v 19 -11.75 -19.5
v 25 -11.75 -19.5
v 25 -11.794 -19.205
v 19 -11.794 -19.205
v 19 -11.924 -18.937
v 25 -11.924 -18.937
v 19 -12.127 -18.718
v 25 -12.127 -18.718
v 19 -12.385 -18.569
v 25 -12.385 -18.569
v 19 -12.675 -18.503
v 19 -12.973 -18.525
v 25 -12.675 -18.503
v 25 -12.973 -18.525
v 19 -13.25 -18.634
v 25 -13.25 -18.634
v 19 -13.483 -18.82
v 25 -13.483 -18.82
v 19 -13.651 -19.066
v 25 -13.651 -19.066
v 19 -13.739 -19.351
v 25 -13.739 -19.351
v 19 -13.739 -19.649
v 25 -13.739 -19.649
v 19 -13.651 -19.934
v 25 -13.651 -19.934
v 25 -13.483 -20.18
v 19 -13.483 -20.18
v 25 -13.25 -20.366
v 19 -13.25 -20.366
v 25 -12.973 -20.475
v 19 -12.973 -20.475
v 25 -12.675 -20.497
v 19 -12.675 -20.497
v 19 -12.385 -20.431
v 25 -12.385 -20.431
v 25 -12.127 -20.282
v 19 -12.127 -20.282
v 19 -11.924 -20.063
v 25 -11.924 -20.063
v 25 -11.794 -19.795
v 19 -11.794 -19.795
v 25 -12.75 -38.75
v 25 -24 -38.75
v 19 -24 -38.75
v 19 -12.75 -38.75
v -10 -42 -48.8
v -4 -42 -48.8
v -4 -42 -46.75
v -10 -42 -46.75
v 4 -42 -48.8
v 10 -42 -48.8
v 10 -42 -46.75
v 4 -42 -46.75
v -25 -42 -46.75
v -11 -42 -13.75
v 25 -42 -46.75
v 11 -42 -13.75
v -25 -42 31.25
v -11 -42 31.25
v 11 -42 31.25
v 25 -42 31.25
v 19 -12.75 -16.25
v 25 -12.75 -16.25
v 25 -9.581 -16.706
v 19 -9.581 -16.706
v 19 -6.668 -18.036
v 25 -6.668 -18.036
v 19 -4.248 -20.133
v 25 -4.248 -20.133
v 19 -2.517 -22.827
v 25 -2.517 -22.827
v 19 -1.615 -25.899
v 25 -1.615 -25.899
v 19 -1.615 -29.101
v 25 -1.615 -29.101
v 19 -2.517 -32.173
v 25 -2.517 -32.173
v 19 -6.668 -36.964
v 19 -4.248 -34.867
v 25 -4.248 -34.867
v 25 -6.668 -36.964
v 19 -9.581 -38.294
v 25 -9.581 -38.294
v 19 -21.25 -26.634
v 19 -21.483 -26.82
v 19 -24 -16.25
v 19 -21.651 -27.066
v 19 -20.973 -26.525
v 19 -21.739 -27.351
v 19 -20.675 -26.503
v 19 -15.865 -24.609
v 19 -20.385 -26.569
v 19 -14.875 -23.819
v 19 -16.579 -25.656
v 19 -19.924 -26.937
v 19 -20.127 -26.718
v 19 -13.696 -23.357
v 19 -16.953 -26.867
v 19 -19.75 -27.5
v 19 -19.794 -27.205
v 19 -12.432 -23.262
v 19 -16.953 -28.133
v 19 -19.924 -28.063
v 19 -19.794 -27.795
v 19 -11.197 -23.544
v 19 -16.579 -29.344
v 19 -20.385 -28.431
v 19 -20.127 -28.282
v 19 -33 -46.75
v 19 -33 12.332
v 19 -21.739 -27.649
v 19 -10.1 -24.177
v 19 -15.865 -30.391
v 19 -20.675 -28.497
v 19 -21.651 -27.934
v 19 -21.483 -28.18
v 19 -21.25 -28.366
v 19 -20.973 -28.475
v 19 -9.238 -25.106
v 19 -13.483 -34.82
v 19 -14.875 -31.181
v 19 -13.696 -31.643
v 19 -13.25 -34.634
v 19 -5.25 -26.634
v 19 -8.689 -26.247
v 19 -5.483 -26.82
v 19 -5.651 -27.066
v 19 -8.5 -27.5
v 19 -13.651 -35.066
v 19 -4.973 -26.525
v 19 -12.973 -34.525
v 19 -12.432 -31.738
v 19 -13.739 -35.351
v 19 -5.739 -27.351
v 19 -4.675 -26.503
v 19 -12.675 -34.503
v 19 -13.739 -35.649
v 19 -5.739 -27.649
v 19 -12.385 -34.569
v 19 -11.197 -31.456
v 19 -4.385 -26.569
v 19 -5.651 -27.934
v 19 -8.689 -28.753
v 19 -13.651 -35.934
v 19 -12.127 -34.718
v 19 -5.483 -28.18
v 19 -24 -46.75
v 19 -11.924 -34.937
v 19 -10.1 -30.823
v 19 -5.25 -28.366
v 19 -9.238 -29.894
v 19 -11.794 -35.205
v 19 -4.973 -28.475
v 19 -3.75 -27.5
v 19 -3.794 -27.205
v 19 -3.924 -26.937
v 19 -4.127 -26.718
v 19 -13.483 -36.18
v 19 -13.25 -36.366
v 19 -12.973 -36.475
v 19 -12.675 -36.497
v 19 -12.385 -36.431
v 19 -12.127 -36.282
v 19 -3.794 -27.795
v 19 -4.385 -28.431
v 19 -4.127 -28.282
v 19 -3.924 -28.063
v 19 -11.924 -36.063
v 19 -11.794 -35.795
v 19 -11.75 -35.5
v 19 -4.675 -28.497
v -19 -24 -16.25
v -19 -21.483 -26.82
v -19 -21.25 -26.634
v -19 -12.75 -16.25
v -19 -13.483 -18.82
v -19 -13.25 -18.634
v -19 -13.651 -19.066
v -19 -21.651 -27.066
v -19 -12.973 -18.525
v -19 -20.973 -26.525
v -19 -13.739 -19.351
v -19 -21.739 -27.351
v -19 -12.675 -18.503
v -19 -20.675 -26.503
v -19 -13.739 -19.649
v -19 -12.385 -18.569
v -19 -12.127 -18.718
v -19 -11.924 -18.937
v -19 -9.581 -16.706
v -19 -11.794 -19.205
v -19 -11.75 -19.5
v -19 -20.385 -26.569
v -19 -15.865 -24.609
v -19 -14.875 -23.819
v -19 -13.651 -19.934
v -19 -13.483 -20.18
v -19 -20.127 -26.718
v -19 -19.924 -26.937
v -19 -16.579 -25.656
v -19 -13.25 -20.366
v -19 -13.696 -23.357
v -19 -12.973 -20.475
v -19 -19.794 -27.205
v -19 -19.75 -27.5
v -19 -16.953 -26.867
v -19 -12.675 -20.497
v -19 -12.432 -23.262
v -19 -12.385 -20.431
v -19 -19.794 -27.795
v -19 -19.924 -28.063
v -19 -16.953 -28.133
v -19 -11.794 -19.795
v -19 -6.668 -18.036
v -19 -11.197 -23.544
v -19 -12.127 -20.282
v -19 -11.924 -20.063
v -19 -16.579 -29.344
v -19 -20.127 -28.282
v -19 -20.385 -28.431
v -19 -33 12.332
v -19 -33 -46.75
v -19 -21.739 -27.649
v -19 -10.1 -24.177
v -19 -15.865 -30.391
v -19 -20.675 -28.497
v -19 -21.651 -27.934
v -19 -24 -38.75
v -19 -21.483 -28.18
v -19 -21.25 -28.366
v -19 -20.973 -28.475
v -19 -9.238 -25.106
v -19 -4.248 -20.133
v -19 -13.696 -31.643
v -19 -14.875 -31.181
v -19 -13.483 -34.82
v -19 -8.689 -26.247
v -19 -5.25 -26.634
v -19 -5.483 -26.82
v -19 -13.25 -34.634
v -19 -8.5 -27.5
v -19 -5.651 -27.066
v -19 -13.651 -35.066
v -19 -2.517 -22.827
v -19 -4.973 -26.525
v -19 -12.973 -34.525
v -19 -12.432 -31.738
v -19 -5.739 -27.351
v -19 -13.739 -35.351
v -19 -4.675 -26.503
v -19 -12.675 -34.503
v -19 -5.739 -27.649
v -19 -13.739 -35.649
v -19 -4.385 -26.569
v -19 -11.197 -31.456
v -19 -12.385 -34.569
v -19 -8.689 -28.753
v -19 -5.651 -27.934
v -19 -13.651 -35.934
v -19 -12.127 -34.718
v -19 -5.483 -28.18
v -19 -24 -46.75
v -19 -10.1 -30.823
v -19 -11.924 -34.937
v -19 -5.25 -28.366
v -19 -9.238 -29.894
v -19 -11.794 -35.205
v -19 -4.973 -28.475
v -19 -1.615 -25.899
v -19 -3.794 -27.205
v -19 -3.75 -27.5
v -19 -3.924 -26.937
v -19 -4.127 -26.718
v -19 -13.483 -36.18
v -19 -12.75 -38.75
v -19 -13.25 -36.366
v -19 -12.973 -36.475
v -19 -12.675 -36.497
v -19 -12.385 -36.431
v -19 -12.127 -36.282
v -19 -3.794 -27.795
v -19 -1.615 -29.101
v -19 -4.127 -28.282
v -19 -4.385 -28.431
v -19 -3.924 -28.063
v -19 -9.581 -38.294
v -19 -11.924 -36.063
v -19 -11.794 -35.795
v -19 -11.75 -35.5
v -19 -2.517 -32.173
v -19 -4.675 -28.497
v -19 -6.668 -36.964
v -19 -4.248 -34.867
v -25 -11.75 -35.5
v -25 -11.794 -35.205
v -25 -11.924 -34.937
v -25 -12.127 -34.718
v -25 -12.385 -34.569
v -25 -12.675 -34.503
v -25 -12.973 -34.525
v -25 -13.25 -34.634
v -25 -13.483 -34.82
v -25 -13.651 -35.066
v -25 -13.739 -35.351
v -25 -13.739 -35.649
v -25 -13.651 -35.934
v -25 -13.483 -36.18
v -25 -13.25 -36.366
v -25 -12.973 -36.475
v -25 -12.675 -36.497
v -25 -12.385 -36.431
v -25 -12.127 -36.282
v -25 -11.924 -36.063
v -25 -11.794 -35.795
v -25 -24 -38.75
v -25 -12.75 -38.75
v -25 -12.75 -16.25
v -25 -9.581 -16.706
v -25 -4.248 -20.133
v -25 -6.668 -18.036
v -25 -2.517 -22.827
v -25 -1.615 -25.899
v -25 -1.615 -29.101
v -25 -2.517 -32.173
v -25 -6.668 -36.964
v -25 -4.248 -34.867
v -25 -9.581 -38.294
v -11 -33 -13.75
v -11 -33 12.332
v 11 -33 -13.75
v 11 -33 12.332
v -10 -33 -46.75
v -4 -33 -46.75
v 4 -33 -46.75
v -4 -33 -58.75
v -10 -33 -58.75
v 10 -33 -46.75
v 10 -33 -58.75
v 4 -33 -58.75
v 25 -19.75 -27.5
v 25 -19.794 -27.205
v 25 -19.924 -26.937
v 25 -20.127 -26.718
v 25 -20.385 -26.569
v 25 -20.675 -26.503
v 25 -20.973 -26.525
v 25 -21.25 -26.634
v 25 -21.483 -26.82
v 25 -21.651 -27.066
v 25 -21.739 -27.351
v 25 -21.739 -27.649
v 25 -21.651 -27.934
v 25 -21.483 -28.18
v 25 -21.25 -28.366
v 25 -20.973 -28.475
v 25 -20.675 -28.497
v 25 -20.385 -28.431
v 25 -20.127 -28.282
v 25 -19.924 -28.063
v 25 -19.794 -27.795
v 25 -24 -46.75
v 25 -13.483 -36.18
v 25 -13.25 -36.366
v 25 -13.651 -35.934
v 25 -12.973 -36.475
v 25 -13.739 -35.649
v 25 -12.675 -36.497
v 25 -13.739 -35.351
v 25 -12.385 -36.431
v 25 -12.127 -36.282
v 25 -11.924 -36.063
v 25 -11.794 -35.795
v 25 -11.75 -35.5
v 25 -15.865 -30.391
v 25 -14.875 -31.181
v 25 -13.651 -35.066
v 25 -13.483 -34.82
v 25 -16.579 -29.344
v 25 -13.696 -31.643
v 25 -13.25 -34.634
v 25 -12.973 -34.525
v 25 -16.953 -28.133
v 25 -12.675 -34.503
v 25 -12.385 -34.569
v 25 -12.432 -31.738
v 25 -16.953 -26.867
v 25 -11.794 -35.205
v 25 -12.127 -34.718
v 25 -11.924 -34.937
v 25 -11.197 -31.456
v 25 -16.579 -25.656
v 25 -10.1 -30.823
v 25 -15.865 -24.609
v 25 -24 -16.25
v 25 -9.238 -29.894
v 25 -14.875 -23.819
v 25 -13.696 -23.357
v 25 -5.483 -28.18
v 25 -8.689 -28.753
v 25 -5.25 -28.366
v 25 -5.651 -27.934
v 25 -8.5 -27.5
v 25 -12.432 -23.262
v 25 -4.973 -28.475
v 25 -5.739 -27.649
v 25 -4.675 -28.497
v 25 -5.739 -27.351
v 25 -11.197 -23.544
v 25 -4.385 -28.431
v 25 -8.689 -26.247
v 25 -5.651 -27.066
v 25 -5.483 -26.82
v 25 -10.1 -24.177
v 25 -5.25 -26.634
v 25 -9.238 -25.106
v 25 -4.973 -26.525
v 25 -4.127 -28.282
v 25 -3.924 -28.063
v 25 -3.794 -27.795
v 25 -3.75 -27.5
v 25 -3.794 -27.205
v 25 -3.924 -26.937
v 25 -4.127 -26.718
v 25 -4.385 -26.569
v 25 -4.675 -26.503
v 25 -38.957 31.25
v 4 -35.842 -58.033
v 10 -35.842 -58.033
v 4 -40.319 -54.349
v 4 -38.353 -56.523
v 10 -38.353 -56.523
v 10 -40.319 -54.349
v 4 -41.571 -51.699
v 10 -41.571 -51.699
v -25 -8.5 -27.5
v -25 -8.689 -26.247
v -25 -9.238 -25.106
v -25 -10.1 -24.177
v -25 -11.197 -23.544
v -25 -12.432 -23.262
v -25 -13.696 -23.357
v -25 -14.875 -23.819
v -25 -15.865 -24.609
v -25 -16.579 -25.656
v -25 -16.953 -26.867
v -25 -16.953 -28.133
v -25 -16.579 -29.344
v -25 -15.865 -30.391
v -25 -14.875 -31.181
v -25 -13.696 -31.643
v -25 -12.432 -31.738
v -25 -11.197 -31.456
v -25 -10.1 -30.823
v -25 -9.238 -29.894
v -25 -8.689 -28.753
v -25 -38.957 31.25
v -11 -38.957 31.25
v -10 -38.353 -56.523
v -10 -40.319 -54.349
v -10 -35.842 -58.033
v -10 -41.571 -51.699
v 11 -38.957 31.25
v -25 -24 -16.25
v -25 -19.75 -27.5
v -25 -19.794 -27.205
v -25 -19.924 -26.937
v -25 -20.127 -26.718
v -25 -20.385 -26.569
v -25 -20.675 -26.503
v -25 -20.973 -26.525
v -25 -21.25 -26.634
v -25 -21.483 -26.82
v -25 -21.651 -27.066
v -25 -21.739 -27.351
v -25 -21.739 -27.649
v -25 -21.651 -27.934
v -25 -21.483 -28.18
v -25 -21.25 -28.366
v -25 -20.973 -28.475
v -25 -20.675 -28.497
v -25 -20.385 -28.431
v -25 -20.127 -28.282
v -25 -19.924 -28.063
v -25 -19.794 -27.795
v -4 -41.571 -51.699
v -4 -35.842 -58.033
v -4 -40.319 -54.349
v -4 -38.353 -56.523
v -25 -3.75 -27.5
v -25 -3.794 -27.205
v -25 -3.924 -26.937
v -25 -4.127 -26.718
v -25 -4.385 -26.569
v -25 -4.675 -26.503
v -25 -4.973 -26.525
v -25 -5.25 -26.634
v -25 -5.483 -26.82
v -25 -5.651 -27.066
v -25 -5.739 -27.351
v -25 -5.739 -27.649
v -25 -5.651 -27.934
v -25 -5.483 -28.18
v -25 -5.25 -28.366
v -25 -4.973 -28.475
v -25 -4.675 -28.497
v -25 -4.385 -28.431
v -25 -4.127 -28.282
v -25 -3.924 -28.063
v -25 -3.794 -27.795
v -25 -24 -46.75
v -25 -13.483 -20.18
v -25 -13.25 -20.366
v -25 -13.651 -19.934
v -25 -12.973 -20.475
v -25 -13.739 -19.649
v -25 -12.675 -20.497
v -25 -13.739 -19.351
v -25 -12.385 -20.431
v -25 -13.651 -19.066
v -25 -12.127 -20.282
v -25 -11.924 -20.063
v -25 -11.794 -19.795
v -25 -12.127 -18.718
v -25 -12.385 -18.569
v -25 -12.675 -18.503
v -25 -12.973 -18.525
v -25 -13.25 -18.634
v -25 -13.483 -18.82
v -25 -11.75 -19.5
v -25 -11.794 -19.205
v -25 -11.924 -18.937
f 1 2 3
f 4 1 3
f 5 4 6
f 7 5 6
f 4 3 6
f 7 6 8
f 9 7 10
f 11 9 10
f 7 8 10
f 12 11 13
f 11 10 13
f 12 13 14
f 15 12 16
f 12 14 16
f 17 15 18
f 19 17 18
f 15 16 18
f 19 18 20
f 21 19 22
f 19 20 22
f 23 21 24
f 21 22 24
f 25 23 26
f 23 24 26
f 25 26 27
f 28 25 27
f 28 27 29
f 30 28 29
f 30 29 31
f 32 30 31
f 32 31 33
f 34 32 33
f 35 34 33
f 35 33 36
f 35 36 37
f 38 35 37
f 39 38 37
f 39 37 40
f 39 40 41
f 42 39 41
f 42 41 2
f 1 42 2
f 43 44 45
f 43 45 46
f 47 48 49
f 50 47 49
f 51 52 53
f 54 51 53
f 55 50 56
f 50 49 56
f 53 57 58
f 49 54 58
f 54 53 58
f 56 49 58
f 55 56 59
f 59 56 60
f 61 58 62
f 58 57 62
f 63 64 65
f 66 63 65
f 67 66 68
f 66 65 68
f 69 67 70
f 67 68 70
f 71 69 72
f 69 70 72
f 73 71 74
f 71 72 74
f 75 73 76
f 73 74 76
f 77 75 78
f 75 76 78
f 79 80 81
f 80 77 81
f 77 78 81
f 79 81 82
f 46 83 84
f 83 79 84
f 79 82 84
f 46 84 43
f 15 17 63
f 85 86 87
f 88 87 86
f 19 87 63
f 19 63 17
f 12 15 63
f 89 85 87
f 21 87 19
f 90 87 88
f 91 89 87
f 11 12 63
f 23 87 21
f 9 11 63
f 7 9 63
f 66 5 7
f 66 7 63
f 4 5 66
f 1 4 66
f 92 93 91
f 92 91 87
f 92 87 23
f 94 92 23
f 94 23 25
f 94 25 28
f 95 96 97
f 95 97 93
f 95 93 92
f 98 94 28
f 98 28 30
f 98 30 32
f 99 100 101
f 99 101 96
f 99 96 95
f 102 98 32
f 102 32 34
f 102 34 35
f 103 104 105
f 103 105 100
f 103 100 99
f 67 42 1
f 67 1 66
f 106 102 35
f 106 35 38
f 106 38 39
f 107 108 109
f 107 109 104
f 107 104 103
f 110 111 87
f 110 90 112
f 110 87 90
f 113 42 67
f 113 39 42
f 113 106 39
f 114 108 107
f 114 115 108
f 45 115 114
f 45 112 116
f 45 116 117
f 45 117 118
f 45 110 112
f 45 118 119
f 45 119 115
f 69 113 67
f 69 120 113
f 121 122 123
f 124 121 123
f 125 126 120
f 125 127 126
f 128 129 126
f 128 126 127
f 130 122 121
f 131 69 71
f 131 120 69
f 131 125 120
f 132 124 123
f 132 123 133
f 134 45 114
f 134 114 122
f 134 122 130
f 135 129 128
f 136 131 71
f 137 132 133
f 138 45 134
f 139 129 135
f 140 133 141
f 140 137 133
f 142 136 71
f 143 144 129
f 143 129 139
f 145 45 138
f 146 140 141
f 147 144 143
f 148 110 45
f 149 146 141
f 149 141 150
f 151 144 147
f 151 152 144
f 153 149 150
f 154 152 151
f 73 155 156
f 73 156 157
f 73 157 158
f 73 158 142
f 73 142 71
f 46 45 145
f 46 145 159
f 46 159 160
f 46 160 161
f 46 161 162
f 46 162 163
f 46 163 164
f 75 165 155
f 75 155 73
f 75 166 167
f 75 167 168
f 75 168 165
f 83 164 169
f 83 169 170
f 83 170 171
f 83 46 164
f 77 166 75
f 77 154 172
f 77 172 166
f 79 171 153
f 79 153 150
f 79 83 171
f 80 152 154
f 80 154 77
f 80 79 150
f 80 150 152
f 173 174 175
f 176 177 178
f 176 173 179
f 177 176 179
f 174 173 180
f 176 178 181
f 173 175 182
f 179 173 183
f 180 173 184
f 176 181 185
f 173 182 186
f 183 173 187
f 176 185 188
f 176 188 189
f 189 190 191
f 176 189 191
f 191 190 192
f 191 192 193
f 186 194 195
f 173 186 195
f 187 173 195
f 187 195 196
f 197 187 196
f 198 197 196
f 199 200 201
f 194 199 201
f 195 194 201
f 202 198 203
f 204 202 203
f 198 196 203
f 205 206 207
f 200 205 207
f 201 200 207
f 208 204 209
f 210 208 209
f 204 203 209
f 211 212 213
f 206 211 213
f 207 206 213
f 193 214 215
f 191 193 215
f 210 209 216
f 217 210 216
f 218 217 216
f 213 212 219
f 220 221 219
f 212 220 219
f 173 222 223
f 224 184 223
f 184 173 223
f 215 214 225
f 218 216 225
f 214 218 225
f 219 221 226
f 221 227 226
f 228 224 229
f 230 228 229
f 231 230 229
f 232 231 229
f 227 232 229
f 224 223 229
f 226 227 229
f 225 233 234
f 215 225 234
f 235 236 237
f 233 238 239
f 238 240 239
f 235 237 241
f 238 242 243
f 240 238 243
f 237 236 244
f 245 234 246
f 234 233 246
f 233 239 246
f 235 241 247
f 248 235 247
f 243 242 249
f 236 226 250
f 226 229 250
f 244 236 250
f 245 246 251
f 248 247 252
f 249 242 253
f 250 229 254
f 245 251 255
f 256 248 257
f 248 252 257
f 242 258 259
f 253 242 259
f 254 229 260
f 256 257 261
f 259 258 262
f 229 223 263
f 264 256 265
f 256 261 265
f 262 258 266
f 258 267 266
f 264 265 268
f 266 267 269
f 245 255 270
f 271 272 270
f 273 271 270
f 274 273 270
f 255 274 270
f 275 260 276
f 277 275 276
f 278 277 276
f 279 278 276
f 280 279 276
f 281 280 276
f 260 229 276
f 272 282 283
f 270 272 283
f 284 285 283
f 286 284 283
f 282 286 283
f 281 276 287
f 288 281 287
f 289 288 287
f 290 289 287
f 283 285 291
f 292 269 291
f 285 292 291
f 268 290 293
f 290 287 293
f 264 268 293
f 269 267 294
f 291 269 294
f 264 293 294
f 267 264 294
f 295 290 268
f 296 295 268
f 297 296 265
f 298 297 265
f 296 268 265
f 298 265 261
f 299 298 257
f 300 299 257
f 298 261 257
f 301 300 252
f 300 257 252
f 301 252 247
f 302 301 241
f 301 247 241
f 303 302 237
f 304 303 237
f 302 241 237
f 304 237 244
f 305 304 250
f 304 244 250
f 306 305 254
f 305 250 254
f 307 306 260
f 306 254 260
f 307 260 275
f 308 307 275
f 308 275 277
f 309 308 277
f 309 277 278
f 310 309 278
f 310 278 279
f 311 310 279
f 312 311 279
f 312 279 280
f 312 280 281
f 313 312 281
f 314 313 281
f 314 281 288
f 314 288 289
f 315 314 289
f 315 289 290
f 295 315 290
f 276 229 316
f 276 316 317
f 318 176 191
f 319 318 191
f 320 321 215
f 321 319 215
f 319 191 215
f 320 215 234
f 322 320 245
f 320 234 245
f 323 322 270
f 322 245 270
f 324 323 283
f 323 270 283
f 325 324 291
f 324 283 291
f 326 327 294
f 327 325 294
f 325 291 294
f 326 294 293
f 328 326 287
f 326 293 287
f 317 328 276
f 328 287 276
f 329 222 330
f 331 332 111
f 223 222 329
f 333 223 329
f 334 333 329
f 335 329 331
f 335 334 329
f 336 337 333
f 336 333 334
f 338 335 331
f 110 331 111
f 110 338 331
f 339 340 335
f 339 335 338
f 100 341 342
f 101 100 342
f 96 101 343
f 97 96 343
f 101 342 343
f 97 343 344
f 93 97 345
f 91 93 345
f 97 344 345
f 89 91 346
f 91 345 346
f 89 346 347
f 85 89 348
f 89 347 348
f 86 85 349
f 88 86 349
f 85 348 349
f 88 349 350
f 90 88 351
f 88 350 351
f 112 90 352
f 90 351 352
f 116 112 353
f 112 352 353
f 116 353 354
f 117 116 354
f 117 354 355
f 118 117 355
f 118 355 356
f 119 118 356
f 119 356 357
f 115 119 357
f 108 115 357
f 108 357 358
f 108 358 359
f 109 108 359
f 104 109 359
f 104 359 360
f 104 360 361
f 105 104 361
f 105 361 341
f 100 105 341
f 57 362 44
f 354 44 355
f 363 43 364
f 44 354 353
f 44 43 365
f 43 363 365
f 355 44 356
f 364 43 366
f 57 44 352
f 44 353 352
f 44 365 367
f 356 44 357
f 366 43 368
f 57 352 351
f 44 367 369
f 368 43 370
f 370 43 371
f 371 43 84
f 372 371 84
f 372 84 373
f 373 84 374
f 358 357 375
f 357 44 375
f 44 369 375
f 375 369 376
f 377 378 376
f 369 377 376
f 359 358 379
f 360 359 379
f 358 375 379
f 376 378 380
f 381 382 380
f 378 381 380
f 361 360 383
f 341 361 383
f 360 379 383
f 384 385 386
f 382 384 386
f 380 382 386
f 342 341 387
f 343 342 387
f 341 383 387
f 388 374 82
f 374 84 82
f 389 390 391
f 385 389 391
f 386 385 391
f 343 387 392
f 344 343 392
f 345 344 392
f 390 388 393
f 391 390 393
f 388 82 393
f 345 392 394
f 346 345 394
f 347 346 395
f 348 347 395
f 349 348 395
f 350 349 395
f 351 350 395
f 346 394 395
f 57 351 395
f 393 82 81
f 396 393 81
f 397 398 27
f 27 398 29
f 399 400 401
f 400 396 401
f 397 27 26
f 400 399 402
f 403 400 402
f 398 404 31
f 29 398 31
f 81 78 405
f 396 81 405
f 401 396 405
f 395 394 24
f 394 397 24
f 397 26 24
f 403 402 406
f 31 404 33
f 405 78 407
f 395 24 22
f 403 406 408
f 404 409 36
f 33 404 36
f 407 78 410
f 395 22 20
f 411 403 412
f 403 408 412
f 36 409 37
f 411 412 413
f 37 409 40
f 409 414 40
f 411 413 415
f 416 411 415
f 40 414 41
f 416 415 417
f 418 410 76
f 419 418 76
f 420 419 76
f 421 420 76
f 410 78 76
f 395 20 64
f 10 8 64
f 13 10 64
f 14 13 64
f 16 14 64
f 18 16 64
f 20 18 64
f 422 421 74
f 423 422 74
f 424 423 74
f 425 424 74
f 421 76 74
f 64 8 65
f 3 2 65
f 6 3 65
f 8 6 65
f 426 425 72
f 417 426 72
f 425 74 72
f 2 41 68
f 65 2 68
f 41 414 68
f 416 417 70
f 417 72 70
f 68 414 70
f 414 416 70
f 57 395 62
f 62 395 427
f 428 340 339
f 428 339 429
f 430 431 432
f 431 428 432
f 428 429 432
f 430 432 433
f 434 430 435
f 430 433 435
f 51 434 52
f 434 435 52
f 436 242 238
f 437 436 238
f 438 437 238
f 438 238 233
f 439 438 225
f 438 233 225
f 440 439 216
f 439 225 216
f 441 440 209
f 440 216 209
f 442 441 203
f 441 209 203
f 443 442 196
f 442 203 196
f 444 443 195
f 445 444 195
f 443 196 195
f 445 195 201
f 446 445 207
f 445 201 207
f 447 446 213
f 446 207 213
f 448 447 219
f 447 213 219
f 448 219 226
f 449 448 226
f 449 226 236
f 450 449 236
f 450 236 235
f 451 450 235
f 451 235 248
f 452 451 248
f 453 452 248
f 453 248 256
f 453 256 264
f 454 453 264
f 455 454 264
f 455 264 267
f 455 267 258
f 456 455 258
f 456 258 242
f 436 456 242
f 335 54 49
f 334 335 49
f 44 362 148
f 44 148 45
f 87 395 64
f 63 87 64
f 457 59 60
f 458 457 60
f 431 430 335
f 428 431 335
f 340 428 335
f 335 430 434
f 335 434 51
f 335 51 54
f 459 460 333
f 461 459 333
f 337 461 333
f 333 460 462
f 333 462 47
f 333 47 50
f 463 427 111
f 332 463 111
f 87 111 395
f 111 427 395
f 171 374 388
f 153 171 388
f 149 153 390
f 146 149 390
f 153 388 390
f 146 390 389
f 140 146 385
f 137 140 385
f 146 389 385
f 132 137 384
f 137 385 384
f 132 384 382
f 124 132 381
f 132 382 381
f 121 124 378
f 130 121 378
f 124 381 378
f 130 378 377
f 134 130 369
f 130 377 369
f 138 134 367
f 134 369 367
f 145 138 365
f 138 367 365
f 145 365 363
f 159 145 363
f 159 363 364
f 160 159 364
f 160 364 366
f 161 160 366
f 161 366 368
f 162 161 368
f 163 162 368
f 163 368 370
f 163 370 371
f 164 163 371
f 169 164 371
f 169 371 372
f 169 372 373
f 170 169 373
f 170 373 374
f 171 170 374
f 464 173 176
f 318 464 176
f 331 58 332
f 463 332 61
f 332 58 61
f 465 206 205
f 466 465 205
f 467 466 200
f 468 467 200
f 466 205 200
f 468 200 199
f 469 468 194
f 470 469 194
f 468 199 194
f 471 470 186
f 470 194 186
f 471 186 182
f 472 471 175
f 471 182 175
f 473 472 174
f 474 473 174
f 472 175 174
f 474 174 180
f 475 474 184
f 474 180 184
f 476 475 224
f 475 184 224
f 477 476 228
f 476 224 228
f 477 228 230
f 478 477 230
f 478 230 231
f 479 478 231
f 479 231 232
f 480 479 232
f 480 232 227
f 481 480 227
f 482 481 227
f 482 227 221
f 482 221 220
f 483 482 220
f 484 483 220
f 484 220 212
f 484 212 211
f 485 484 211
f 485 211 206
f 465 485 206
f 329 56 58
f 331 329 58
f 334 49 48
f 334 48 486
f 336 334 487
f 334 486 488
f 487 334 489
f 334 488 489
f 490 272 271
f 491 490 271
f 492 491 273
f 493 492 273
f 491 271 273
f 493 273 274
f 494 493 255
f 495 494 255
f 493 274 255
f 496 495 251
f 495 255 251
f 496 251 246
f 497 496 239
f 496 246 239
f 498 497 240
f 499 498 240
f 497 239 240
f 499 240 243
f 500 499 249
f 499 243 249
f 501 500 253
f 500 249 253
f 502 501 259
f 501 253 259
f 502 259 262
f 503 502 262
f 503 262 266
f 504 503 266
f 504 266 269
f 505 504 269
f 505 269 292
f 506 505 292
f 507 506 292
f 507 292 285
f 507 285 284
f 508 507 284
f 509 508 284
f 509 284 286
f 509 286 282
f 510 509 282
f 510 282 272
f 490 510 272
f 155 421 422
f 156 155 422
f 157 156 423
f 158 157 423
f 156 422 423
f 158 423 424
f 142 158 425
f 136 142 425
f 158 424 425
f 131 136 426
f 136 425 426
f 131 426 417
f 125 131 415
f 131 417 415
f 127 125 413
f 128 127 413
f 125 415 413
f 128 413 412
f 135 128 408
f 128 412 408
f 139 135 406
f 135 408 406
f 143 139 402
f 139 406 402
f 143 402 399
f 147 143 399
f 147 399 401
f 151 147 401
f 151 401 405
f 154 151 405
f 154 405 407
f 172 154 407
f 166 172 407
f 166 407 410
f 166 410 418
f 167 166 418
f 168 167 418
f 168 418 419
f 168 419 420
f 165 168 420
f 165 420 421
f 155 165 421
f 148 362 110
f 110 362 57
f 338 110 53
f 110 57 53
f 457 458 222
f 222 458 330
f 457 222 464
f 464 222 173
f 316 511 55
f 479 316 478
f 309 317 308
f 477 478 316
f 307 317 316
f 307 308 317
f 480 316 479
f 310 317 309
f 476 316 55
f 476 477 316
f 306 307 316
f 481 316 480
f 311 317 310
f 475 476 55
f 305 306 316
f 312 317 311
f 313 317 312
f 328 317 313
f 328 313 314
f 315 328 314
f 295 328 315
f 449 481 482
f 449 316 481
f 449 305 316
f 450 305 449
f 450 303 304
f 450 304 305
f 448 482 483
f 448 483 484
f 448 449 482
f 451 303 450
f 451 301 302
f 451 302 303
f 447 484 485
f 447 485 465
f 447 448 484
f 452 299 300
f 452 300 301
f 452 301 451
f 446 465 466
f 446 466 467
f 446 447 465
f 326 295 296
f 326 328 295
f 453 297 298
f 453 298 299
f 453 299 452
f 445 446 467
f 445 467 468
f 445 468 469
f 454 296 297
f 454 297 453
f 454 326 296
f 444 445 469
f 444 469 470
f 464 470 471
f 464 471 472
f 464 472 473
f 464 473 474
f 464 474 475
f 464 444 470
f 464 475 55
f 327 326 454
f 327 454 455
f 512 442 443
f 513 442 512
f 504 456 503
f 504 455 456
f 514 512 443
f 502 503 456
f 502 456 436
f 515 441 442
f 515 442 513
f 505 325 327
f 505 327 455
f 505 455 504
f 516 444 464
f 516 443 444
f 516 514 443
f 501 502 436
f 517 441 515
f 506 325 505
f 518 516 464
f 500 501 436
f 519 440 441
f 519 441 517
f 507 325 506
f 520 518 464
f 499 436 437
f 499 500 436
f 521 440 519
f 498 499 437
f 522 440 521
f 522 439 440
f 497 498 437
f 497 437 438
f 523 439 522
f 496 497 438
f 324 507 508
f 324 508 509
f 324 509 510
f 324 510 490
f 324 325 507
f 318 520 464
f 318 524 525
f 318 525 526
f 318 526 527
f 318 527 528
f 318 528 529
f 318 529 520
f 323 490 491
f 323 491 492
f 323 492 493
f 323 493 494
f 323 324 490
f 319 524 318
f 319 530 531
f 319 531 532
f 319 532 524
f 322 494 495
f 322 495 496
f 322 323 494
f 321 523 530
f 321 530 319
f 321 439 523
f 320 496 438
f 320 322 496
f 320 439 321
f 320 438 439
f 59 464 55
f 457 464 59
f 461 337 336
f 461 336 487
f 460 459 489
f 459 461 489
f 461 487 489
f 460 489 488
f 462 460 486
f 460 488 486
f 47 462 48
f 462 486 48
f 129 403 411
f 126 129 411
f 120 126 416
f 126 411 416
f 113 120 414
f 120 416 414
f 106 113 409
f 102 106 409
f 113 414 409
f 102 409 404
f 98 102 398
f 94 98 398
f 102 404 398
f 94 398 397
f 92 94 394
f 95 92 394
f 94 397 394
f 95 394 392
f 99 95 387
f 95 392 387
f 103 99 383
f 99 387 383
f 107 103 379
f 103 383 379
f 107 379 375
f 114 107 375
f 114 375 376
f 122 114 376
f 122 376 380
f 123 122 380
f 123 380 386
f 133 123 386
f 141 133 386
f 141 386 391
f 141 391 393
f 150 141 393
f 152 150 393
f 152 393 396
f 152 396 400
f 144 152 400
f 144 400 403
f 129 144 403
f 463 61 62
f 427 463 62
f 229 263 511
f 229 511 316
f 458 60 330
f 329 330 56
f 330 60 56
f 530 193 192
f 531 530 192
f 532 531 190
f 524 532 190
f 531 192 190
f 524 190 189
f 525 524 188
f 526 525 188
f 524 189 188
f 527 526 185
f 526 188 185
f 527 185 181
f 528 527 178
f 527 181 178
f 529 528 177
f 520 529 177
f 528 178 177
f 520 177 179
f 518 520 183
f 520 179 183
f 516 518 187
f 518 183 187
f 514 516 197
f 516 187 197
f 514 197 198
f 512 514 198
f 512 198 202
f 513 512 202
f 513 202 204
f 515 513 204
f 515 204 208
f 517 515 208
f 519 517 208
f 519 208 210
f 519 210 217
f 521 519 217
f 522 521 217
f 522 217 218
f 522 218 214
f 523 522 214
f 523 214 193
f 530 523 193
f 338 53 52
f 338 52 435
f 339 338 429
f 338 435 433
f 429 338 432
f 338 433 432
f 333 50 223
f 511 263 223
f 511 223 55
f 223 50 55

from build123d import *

# Parameters (mm, degrees)
SKETCH1_W           = 50
SKETCH1_H           = 170
BOSS_EXTRUDE1_DEPTH = 55
SKETCH2_W           = 34
SKETCH2_H           = 27
CUT_EXTRUDE1_DEPTH  = 181.416185527
SKETCH3_W           = 10
SKETCH3_H           = 24
SKETCH3_R           = 4.25
SKETCH3_R_2         = 1
CUT_EXTRUDE2_DEPTH  = 186.539753153
SKETCH4_W           = 2
SKETCH4_H           = 24
CUT_EXTRUDE3_DEPTH  = 178.623196683
SKETCH5_W           = 6.25
SKETCH5_H           = 11.25
CUT_EXTRUDE4_DEPTH  = 186.539753153
SKETCH6_W           = 38
SKETCH6_H           = 10
CUT_EXTRUDE5_DEPTH  = 181.416185527
SKETCH8_W           = 13.25
SKETCH8_H           = 2.25
CUT_EXTRUDE7_DEPTH  = 186.539753153
SKETCH9_W           = 34
SKETCH9_H           = 35.25
CUT_EXTRUDE8_DEPTH  = 179.297679458
SKETCH11_W          = 13.25
SKETCH11_H          = 20.25
CUT_EXTRUDE9_DEPTH  = 184.480414486
SKETCH12_W          = 28.5
SKETCH12_H          = 15
BOSS_EXTRUDE2_DEPTH = 8
SKETCH14_W          = 34
SKETCH14_H          = 15
SKETCH14_H_2        = 10.25
BOSS_EXTRUDE3_DEPTH = 13.25
SKETCH16_R          = 4.5
SKETCH16_R_2        = 2.5
CUT_EXTRUDE13_DEPTH = 8
SKETCH17_R          = 4.5
SKETCH17_W          = 55
SKETCH17_H          = 10.25
CUT_EXTRUDE15_DEPTH = 175.384811552
SKETCH18_W          = 71.25
SKETCH18_H          = 27.5
SKETCH18_W_2        = 13.75
SKETCH18_W_3        = 16.25
BOSS_EXTRUDE4_DEPTH = 50
SKETCH19_W          = 38
SKETCH19_H          = 7
CUT_EXTRUDE16_DEPTH = 152.25227271
SKETCH20_W          = 57.5
SKETCH20_H          = 27.5
CUT_EXTRUDE17_DEPTH = 102.137591923
CUT_EXTRUDE18_DEPTH = 100.39221549
SKETCH22_W          = 82.5
SKETCH22_H          = 2.5
BOSS_EXTRUDE5_DEPTH = 50
SKETCH24_W          = 22
SKETCH24_H          = 17
CUT_EXTRUDE19_DEPTH = 101.710289941
SKETCH25_W          = 38
SKETCH25_H          = 38.136363636
CUT_EXTRUDE20_DEPTH = 10
SKETCH27_W          = 38
SKETCH27_H          = 60.136363636
BOSS_EXTRUDE6_DEPTH = 8.6
SKETCH29_W          = 38
SKETCH29_H          = 1.4
CUT_EXTRUDE21_DEPTH = 85.601313414
BOSS_EXTRUDE7_DEPTH = 50
SKETCH31_W          = 38
SKETCH31_H          = 17
CUT_EXTRUDE22_DEPTH = 117.365802537
SKETCH32_W          = 100
SKETCH32_H          = 3
CUT_EXTRUDE23_DEPTH = 101.710289941
SKETCH33_W          = 20
SKETCH33_H          = 10
SKETCH33_W_2        = 22
SKETCH33_H_2        = 45
CUT_EXTRUDE24_DEPTH = 84.137311118
SKETCH34_W          = 8
SKETCH34_H          = 12
CUT_EXTRUDE25_DEPTH = 76.0787087
BOSS_EXTRUDE8_DEPTH = 8
SKETCH37_W          = 78
SKETCH37_H          = 9
SKETCH37_W_2        = 12
CUT_EXTRUDE27_DEPTH = 93.48006542
FILLET1_R           = 10


with BuildPart() as part:
    # Sketch1 → Boss-Extrude1 (new body)
    with BuildSketch(Plane.XY):
        with Locations((0, -85)):
            Rectangle(SKETCH1_W, SKETCH1_H)
    extrude(amount=-BOSS_EXTRUDE1_DEPTH)

    # Sketch2 → Cut-Extrude1 (cut, through all)
    with BuildSketch(Plane.XY):
        with Locations((0, -13.5)):
            Rectangle(SKETCH2_W, SKETCH2_H)
    extrude(amount=-CUT_EXTRUDE1_DEPTH, mode=Mode.SUBTRACT)

    # Sketch3 → Cut-Extrude2 (cut, through all)
    with BuildSketch(Plane(origin=(25, 0, 0), x_dir=(0, 0, -1), z_dir=(1, 0, 0))):
        with Locations((50, -12)):
            Rectangle(SKETCH3_W, SKETCH3_H)
        with Locations((5, -12)):
            Rectangle(SKETCH3_W, SKETCH3_H)
        with Locations(Location((27.5, -12.75, 0), (0, 0, 90))):
            Circle(SKETCH3_R)
        with Locations(Location((35.5, -12.75, 0), (0, 0, 90))):
            Circle(SKETCH3_R_2)
        with Locations(Location((27.5, -4.75, 0), (0, 0, 90))):
            Circle(SKETCH3_R_2)
        with Locations(Location((27.5, -20.75, 0), (0, 0, 90))):
            Circle(SKETCH3_R_2)
        with Locations(Location((19.5, -12.75, 0), (0, 0, 90))):
            Circle(SKETCH3_R_2)
    extrude(amount=-CUT_EXTRUDE2_DEPTH, mode=Mode.SUBTRACT)

    # Sketch4 → Cut-Extrude3 (cut, through all)
    with BuildSketch(Plane.XY.offset(-10)):
        with Locations((-18, -12)):
            Rectangle(SKETCH4_W, SKETCH4_H)
        with Locations((18, -12)):
            Rectangle(SKETCH4_W, SKETCH4_H)
    extrude(amount=-CUT_EXTRUDE3_DEPTH, mode=Mode.SUBTRACT)

    # Sketch5 → Cut-Extrude4 (cut, through all)
    with BuildSketch(Plane(origin=(25, 0, 0), x_dir=(0, 0, -1), z_dir=(1, 0, 0))):
        with BuildLine():
            Line((45, 0), (10, 0))
            Line((10, 0), (10, -12.75))
            Line((10, -12.75), (16.25, -12.75))
            ThreePointArc((16.25, -12.75), (27.5, -1.5), (38.75, -12.75))
            Line((38.75, -12.75), (45, -12.75))
            Line((45, -12.75), (45, 0))
        make_face()
        with Locations((13.125, -18.375)):
            Rectangle(SKETCH5_W, SKETCH5_H)
        with Locations((41.875, -18.375)):
            Rectangle(SKETCH5_W, SKETCH5_H)
    extrude(amount=-CUT_EXTRUDE4_DEPTH, mode=Mode.SUBTRACT)

    # Sketch6 → Cut-Extrude5 (cut, through all)
    with BuildSketch(Plane.XY):
        with Locations((0, -29)):
            Rectangle(SKETCH6_W, SKETCH6_H)
    extrude(amount=-CUT_EXTRUDE5_DEPTH, mode=Mode.SUBTRACT)

    # Sketch8 → Cut-Extrude7 (cut, through all)
    with BuildSketch(Plane(origin=(25, 0, 0), x_dir=(0, 0, -1), z_dir=(1, 0, 0))):
        with BuildLine():
            Line((27.5, -157.5), (27.5, -132.5))
            Line((27.5, -132.5), (13.25, -132.5))
            Line((13.25, -132.5), (13.25, -167.75))
            Line((13.25, -167.75), (17.25, -167.75))
            ThreePointArc((17.25, -167.75), (20.252155493, -160.502155493), (27.5, -157.5))
        make_face()
        with BuildLine():
            Line((41.75, -167.75), (41.75, -132.5))
            Line((41.75, -132.5), (27.5, -132.5))
            Line((27.5, -132.5), (27.5, -157.5))
            ThreePointArc((27.5, -157.5), (34.747844507, -160.502155493), (37.75, -167.75))
            Line((37.75, -167.75), (41.75, -167.75))
        make_face()
        with Locations((48.375, -168.875)):
            Rectangle(SKETCH8_W, SKETCH8_H)
        with Locations((6.625, -168.875)):
            Rectangle(SKETCH8_W, SKETCH8_H)
        with BuildLine():
            Line((17.25, -167.75), (13.25, -167.75))
            Line((13.25, -167.75), (13.25, -170))
            Line((13.25, -170), (17.5, -170))
            ThreePointArc((17.5, -170), (17.31269172, -168.881923142), (17.25, -167.75))
        make_face()
        with BuildLine():
            Line((41.75, -170), (41.75, -167.75))
            Line((41.75, -167.75), (37.75, -167.75))
            ThreePointArc((37.75, -167.75), (37.68730828, -168.881923142), (37.5, -170))
            Line((37.5, -170), (41.75, -170))
        make_face()
        with BuildLine():
            Line((27.5, -167.75), (27.5, -157.5))
            ThreePointArc((27.5, -157.5), (20.252155493, -160.502155493), (17.25, -167.75))
            Line((17.25, -167.75), (27.5, -167.75))
        make_face()
        with BuildLine():
            ThreePointArc((37.75, -167.75), (34.747844507, -160.502155493), (27.5, -157.5))
            Line((27.5, -157.5), (27.5, -167.75))
            Line((27.5, -167.75), (37.75, -167.75))
        make_face()
        with BuildLine():
            Line((27.5, -170), (27.5, -167.75))
            Line((27.5, -167.75), (17.25, -167.75))
            ThreePointArc((17.25, -167.75), (17.31269172, -168.881923142), (17.5, -170))
            Line((17.5, -170), (27.5, -170))
        make_face()
        with BuildLine():
            ThreePointArc((37.5, -170), (37.68730828, -168.881923142), (37.75, -167.75))
            Line((37.75, -167.75), (27.5, -167.75))
            Line((27.5, -167.75), (27.5, -170))
            Line((27.5, -170), (37.5, -170))
        make_face()
    extrude(amount=-CUT_EXTRUDE7_DEPTH, mode=Mode.SUBTRACT)

    # Sketch9 → Cut-Extrude8 (cut, through all)
    with BuildSketch(Plane.XY):
        with Locations((0, -150.125)):
            Rectangle(SKETCH9_W, SKETCH9_H)
    extrude(amount=-CUT_EXTRUDE8_DEPTH, mode=Mode.SUBTRACT)

    # Sketch11 → Cut-Extrude9 (cut, through all)
    with BuildSketch(Plane(origin=(25, 0, 0), x_dir=(0, 0, -1), z_dir=(1, 0, 0))):
        with BuildLine():
            ThreePointArc((17.25, -167.75), (20.252155493, -160.502155493), (27.5, -157.5))
            Line((27.5, -157.5), (27.5, -147.5))
            Line((27.5, -147.5), (13.25, -147.5))
            Line((13.25, -147.5), (13.25, -167.75))
            Line((13.25, -167.75), (17.25, -167.75))
        make_face()
        with BuildLine():
            Line((27.5, -147.5), (27.5, -157.5))
            ThreePointArc((27.5, -157.5), (34.747844507, -160.502155493), (37.75, -167.75))
            Line((37.75, -167.75), (41.75, -167.75))
            Line((41.75, -167.75), (41.75, -147.5))
            Line((41.75, -147.5), (27.5, -147.5))
        make_face()
        with Locations((48.375, -157.625)):
            Rectangle(SKETCH11_W, SKETCH11_H)
        with Locations((6.625, -157.625)):
            Rectangle(SKETCH11_W, SKETCH11_H)
    extrude(amount=-CUT_EXTRUDE9_DEPTH, mode=Mode.SUBTRACT)

    # Sketch12 → Boss-Extrude2 (add)
    with BuildSketch(Plane(origin=(25, 0, 0), x_dir=(0, 0, -1), z_dir=(1, 0, 0))):
        with Locations((27.5, -140)):
            Rectangle(SKETCH12_W, SKETCH12_H)
    boss_extrude2 = extrude(amount=-BOSS_EXTRUDE2_DEPTH)

    # Mirror1: Boss-Extrude2 across plane
    add(boss_extrude2.mirror(Plane(origin=(0, 0, 0), x_dir=(0, 0, 1), z_dir=(1, 0, 0))))

    # Sketch14 → Boss-Extrude3 (add)
    with BuildSketch(Plane.XY):
        with Locations((0, -140)):
            Rectangle(SKETCH14_W, SKETCH14_H)
        with Locations((0, -152.625)):
            Rectangle(SKETCH14_W, SKETCH14_H_2)
    boss_extrude3 = extrude(amount=-BOSS_EXTRUDE3_DEPTH)

    # Mirror2: Boss-Extrude3 across plane
    add(boss_extrude3.mirror(Plane.XY.offset(-27.5)))

    # Sketch16 → Cut-Extrude13 (cut)
    # profile 1 of 3: a face of its own
    with BuildSketch(Plane(origin=(25, 0, 0), x_dir=(0, 0, -1), z_dir=(1, 0, 0))):
        with Locations(Location((16.5, -135.75, 0), (0, 0, 90))):
            Circle(SKETCH16_R)
        with Locations((16.5, -135.75)):
            Circle(SKETCH16_R_2, mode=Mode.SUBTRACT)
    # profile 2 of 3: a face of its own
    with BuildSketch(Plane(origin=(25, 0, 0), x_dir=(0, 0, -1), z_dir=(1, 0, 0))):
        with Locations((16.5, -135.75)):
            Circle(SKETCH16_R_2)
    # profile 3 of 3: a face of its own
    with BuildSketch(Plane(origin=(25, 0, 0), x_dir=(0, 0, -1), z_dir=(1, 0, 0))):
        with Locations(Location((38.5, -135.75, 0), (0, 0, 90))):
            Circle(SKETCH16_R)
    cut_extrude13 = extrude(amount=-CUT_EXTRUDE13_DEPTH, mode=Mode.SUBTRACT)

    # Mirror3: Cut-Extrude13 across plane
    add(cut_extrude13.mirror(Plane(origin=(0, 0, 0), x_dir=(0, 0, 1), z_dir=(1, 0, 0))), mode=Mode.SUBTRACT)

    # Sketch17 → Cut-Extrude15 (cut, through all)
    # profile 1 of 4: a face of its own
    with BuildSketch(Plane(origin=(25, 0, 0), x_dir=(0, 0, -1), z_dir=(1, 0, 0))):
        Polygon((55, -51.5), (27.5, -51.5), (0, -51.5), (0, -147.5), (55, -147.5), align=None)
        with Locations((16.5, -135.75)):
            Circle(SKETCH17_R, mode=Mode.SUBTRACT)
        with Locations((38.5, -135.75)):
            Circle(SKETCH17_R, mode=Mode.SUBTRACT)
    # profile 2 of 4: a face of its own
    with BuildSketch(Plane(origin=(25, 0, 0), x_dir=(0, 0, -1), z_dir=(1, 0, 0))):
        with Locations((27.5, -152.625)):
            Rectangle(SKETCH17_W, SKETCH17_H)
    # profile 3 of 4: a face of its own
    with BuildSketch(Plane(origin=(25, 0, 0), x_dir=(0, 0, -1), z_dir=(1, 0, 0))):
        with Locations((38.5, -135.75)):
            Circle(SKETCH17_R)
    # profile 4 of 4: a face of its own
    with BuildSketch(Plane(origin=(25, 0, 0), x_dir=(0, 0, -1), z_dir=(1, 0, 0))):
        with Locations((16.5, -135.75)):
            Circle(SKETCH17_R)
    extrude(amount=-CUT_EXTRUDE15_DEPTH, mode=Mode.SUBTRACT)

    # Sketch18 → Boss-Extrude4 (add)
    with BuildSketch(Plane(origin=(25, 0, 0), x_dir=(0, 0, -1), z_dir=(1, 0, 0))):
        with Locations((-35.625, -37.75)):
            Rectangle(SKETCH18_W, SKETCH18_H)
        with Locations((61.875, -37.75)):
            Rectangle(SKETCH18_W_2, SKETCH18_H)
        Polygon((38.75, -51.5), (38.75, -24), (16.25, -24), (0, -24), (0, -51.5), align=None)
        with Locations((46.875, -37.75)):
            Rectangle(SKETCH18_W_3, SKETCH18_H)
    extrude(amount=-BOSS_EXTRUDE4_DEPTH)

    # Sketch19 → Cut-Extrude16 (cut, through all)
    with BuildSketch(Plane.XY.offset(71.25)):
        with Locations((0, -27.5)):
            Rectangle(SKETCH19_W, SKETCH19_H)
    extrude(amount=-CUT_EXTRUDE16_DEPTH, mode=Mode.SUBTRACT)

    # Sketch20 → Cut-Extrude17 (cut, through all)
    with BuildSketch(Plane(origin=(25, 0, 0), x_dir=(0, 0, -1), z_dir=(1, 0, 0))):
        with Locations((-42.5, -37.75)):
            Rectangle(SKETCH20_W, SKETCH20_H)
    extrude(amount=-CUT_EXTRUDE17_DEPTH, mode=Mode.SUBTRACT)

    # Sketch21 → Cut-Extrude18 (cut, through all)
    with BuildSketch(Plane(origin=(25, 0, 0), x_dir=(0, 0, -1), z_dir=(1, 0, 0))):
        Polygon((16.25, -24), (-13.75, -51.5), (-13.75, -24), align=None)
    extrude(amount=-CUT_EXTRUDE18_DEPTH, mode=Mode.SUBTRACT)

    # Sketch22 → Boss-Extrude5 (add)
    with BuildSketch(Plane(origin=(25, 0, 0), x_dir=(0, 0, -1), z_dir=(1, 0, 0))):
        with Locations((27.5, -52.75)):
            Rectangle(SKETCH22_W, SKETCH22_H)
    extrude(amount=-BOSS_EXTRUDE5_DEPTH)

    # Sketch24 → Cut-Extrude19 (cut, through all)
    with BuildSketch(Plane(origin=(25, 0, 0), x_dir=(0, 0, -1), z_dir=(1, 0, 0))):
        with Locations((57.75, -32.5)):
            Rectangle(SKETCH24_W, SKETCH24_H)
    extrude(amount=-CUT_EXTRUDE19_DEPTH, mode=Mode.SUBTRACT)

    # Sketch25 → Cut-Extrude20 (cut)
    with BuildSketch(Plane(origin=(0, -31, 0), x_dir=(1, 0, 0), z_dir=(0, 1, 0))):
        with Locations((0, 27.681818182)):
            Rectangle(SKETCH25_W, SKETCH25_H)
    extrude(amount=-CUT_EXTRUDE20_DEPTH, mode=Mode.SUBTRACT)

    # Sketch27 → Boss-Extrude6 (add)
    with BuildSketch(Plane(origin=(0, -41, 0), x_dir=(1, 0, 0), z_dir=(0, 1, 0))):
        with Locations((0, 38.681818182)):
            Rectangle(SKETCH27_W, SKETCH27_H)
    extrude(amount=BOSS_EXTRUDE6_DEPTH)

    # Sketch29 → Cut-Extrude21 (cut, through all)
    with BuildSketch(Plane(origin=(0, 0, -8.613636364), x_dir=(-1, 0, 0), z_dir=(0, 0, -1))):
        with Locations((0, -31.7)):
            Rectangle(SKETCH29_W, SKETCH29_H)
    extrude(amount=-CUT_EXTRUDE21_DEPTH, mode=Mode.SUBTRACT)

    # Sketch30 → Boss-Extrude7 (add)
    with BuildSketch(Plane.ZY.offset(25)):
        Polygon((31.25, -38.957214173), (-16.25, -24), (-7.086363636, -32.4), (13.75, -51.5), (13.75, -53.914428346), (31.25, -53.914428346), align=None)
        Polygon((-16.25, -24), (-16.25, -32.4), (-7.086363636, -32.4), align=None)
    extrude(amount=-BOSS_EXTRUDE7_DEPTH)

    # Sketch31 → Cut-Extrude22 (cut, through all)
    with BuildSketch(Plane(origin=(0, 0, -68.75), x_dir=(-1, 0, 0), z_dir=(0, 0, -1))):
        with Locations((0, -32.5)):
            Rectangle(SKETCH31_W, SKETCH31_H)
    extrude(amount=-CUT_EXTRUDE22_DEPTH, mode=Mode.SUBTRACT)

    # Sketch32 → Cut-Extrude23 (cut, through all)
    with BuildSketch(Plane(origin=(25, 0, 0), x_dir=(0, 0, -1), z_dir=(1, 0, 0))):
        with Locations((18.75, -52.5)):
            Rectangle(SKETCH32_W, SKETCH32_H)
    extrude(amount=-CUT_EXTRUDE23_DEPTH, mode=Mode.SUBTRACT)

    # Sketch33 → Cut-Extrude24 (cut, through all)
    with BuildSketch(Plane(origin=(0, -41, 0), x_dir=(1, 0, 0), z_dir=(0, 1, 0))):
        Polygon((-10, 68.75), (-25, 68.75), (-25, 46.75), (-19, 46.75), (-10, 46.75), (-10, 58.75), align=None)
        Polygon((25, 68.75), (10, 68.75), (10, 58.75), (10, 46.75), (19, 46.75), (25, 46.75), align=None)
        with Locations((0, 63.75)):
            Rectangle(SKETCH33_W, SKETCH33_H)
        with Locations((0, -8.75)):
            Rectangle(SKETCH33_W_2, SKETCH33_H_2)
    extrude(amount=-CUT_EXTRUDE24_DEPTH, mode=Mode.SUBTRACT)

    # Sketch34 → Cut-Extrude25 (cut, through all)
    with BuildSketch(Plane(origin=(0, -41, 0), x_dir=(1, 0, 0), z_dir=(0, 1, 0))):
        with Locations((0, 52.75)):
            Rectangle(SKETCH34_W, SKETCH34_H)
    extrude(amount=-CUT_EXTRUDE25_DEPTH, mode=Mode.SUBTRACT)

    # Sketch36 → Boss-Extrude8 (add)
    with BuildSketch(Plane(origin=(0, -41, 0), x_dir=(1, 0, 0), z_dir=(0, 1, 0))):
        Polygon((4, 58.75), (4, 46.75), (-4, 46.75), (-4, 58.75), (-10, 58.75), (-10, 46.75), (-19, 46.75), (-19, -31.25), (-11, -31.25), (-11, 13.75), (11, 13.75), (11, -31.25), (19, -31.25), (19, 46.75), (10, 46.75), (10, 58.75), align=None)
    extrude(amount=BOSS_EXTRUDE8_DEPTH)

    # Sketch37 → Cut-Extrude27 (cut, through all)
    with BuildSketch(Plane(origin=(25, 0, 0), x_dir=(0, 0, -1), z_dir=(1, 0, 0))):
        with Locations((7.75, -46.5)):
            Rectangle(SKETCH37_W, SKETCH37_H)
        Polygon((-31.25, -33), (-31.25, -38.957214173), (-12.331525614, -33), align=None)
        with Locations((52.75, -46.5)):
            Rectangle(SKETCH37_W_2, SKETCH37_H)
    extrude(amount=-CUT_EXTRUDE27_DEPTH, mode=Mode.SUBTRACT)

    # Fillet1
    # the kernel refuses this fillet: 10 mm, written as the material it takes off along each edge
    with BuildSketch(Plane(origin=(20.874685928, -42, -58.75), x_dir=(0, 0, 1), z_dir=(-1, 0, 0)), Plane(origin=(34.874685928, -42, -58.75), x_dir=(0, 0, 1), z_dir=(-1, 0, 0))) as fillet1_piece_1:
        with BuildLine():
            CenterArc((9.949874371, 10), FILLET1_R, 185.739170477, 84.260829523)
            Line((0, 9), (-0.198997487, 8.98))
            ThreePointArc((-0.198997487, 8.98), (-0.2, 4.5), (-0.2, 0))
            Line((-0.2, 0), (0, -0.2))
            Line((0, -0.2), (9.949874371, -0.2))
            Line((9.949874371, -0.2), (9.949874371, 0))
        make_face()
    extrude(amount=55.749371855, mode=Mode.SUBTRACT)


solid = part.part
